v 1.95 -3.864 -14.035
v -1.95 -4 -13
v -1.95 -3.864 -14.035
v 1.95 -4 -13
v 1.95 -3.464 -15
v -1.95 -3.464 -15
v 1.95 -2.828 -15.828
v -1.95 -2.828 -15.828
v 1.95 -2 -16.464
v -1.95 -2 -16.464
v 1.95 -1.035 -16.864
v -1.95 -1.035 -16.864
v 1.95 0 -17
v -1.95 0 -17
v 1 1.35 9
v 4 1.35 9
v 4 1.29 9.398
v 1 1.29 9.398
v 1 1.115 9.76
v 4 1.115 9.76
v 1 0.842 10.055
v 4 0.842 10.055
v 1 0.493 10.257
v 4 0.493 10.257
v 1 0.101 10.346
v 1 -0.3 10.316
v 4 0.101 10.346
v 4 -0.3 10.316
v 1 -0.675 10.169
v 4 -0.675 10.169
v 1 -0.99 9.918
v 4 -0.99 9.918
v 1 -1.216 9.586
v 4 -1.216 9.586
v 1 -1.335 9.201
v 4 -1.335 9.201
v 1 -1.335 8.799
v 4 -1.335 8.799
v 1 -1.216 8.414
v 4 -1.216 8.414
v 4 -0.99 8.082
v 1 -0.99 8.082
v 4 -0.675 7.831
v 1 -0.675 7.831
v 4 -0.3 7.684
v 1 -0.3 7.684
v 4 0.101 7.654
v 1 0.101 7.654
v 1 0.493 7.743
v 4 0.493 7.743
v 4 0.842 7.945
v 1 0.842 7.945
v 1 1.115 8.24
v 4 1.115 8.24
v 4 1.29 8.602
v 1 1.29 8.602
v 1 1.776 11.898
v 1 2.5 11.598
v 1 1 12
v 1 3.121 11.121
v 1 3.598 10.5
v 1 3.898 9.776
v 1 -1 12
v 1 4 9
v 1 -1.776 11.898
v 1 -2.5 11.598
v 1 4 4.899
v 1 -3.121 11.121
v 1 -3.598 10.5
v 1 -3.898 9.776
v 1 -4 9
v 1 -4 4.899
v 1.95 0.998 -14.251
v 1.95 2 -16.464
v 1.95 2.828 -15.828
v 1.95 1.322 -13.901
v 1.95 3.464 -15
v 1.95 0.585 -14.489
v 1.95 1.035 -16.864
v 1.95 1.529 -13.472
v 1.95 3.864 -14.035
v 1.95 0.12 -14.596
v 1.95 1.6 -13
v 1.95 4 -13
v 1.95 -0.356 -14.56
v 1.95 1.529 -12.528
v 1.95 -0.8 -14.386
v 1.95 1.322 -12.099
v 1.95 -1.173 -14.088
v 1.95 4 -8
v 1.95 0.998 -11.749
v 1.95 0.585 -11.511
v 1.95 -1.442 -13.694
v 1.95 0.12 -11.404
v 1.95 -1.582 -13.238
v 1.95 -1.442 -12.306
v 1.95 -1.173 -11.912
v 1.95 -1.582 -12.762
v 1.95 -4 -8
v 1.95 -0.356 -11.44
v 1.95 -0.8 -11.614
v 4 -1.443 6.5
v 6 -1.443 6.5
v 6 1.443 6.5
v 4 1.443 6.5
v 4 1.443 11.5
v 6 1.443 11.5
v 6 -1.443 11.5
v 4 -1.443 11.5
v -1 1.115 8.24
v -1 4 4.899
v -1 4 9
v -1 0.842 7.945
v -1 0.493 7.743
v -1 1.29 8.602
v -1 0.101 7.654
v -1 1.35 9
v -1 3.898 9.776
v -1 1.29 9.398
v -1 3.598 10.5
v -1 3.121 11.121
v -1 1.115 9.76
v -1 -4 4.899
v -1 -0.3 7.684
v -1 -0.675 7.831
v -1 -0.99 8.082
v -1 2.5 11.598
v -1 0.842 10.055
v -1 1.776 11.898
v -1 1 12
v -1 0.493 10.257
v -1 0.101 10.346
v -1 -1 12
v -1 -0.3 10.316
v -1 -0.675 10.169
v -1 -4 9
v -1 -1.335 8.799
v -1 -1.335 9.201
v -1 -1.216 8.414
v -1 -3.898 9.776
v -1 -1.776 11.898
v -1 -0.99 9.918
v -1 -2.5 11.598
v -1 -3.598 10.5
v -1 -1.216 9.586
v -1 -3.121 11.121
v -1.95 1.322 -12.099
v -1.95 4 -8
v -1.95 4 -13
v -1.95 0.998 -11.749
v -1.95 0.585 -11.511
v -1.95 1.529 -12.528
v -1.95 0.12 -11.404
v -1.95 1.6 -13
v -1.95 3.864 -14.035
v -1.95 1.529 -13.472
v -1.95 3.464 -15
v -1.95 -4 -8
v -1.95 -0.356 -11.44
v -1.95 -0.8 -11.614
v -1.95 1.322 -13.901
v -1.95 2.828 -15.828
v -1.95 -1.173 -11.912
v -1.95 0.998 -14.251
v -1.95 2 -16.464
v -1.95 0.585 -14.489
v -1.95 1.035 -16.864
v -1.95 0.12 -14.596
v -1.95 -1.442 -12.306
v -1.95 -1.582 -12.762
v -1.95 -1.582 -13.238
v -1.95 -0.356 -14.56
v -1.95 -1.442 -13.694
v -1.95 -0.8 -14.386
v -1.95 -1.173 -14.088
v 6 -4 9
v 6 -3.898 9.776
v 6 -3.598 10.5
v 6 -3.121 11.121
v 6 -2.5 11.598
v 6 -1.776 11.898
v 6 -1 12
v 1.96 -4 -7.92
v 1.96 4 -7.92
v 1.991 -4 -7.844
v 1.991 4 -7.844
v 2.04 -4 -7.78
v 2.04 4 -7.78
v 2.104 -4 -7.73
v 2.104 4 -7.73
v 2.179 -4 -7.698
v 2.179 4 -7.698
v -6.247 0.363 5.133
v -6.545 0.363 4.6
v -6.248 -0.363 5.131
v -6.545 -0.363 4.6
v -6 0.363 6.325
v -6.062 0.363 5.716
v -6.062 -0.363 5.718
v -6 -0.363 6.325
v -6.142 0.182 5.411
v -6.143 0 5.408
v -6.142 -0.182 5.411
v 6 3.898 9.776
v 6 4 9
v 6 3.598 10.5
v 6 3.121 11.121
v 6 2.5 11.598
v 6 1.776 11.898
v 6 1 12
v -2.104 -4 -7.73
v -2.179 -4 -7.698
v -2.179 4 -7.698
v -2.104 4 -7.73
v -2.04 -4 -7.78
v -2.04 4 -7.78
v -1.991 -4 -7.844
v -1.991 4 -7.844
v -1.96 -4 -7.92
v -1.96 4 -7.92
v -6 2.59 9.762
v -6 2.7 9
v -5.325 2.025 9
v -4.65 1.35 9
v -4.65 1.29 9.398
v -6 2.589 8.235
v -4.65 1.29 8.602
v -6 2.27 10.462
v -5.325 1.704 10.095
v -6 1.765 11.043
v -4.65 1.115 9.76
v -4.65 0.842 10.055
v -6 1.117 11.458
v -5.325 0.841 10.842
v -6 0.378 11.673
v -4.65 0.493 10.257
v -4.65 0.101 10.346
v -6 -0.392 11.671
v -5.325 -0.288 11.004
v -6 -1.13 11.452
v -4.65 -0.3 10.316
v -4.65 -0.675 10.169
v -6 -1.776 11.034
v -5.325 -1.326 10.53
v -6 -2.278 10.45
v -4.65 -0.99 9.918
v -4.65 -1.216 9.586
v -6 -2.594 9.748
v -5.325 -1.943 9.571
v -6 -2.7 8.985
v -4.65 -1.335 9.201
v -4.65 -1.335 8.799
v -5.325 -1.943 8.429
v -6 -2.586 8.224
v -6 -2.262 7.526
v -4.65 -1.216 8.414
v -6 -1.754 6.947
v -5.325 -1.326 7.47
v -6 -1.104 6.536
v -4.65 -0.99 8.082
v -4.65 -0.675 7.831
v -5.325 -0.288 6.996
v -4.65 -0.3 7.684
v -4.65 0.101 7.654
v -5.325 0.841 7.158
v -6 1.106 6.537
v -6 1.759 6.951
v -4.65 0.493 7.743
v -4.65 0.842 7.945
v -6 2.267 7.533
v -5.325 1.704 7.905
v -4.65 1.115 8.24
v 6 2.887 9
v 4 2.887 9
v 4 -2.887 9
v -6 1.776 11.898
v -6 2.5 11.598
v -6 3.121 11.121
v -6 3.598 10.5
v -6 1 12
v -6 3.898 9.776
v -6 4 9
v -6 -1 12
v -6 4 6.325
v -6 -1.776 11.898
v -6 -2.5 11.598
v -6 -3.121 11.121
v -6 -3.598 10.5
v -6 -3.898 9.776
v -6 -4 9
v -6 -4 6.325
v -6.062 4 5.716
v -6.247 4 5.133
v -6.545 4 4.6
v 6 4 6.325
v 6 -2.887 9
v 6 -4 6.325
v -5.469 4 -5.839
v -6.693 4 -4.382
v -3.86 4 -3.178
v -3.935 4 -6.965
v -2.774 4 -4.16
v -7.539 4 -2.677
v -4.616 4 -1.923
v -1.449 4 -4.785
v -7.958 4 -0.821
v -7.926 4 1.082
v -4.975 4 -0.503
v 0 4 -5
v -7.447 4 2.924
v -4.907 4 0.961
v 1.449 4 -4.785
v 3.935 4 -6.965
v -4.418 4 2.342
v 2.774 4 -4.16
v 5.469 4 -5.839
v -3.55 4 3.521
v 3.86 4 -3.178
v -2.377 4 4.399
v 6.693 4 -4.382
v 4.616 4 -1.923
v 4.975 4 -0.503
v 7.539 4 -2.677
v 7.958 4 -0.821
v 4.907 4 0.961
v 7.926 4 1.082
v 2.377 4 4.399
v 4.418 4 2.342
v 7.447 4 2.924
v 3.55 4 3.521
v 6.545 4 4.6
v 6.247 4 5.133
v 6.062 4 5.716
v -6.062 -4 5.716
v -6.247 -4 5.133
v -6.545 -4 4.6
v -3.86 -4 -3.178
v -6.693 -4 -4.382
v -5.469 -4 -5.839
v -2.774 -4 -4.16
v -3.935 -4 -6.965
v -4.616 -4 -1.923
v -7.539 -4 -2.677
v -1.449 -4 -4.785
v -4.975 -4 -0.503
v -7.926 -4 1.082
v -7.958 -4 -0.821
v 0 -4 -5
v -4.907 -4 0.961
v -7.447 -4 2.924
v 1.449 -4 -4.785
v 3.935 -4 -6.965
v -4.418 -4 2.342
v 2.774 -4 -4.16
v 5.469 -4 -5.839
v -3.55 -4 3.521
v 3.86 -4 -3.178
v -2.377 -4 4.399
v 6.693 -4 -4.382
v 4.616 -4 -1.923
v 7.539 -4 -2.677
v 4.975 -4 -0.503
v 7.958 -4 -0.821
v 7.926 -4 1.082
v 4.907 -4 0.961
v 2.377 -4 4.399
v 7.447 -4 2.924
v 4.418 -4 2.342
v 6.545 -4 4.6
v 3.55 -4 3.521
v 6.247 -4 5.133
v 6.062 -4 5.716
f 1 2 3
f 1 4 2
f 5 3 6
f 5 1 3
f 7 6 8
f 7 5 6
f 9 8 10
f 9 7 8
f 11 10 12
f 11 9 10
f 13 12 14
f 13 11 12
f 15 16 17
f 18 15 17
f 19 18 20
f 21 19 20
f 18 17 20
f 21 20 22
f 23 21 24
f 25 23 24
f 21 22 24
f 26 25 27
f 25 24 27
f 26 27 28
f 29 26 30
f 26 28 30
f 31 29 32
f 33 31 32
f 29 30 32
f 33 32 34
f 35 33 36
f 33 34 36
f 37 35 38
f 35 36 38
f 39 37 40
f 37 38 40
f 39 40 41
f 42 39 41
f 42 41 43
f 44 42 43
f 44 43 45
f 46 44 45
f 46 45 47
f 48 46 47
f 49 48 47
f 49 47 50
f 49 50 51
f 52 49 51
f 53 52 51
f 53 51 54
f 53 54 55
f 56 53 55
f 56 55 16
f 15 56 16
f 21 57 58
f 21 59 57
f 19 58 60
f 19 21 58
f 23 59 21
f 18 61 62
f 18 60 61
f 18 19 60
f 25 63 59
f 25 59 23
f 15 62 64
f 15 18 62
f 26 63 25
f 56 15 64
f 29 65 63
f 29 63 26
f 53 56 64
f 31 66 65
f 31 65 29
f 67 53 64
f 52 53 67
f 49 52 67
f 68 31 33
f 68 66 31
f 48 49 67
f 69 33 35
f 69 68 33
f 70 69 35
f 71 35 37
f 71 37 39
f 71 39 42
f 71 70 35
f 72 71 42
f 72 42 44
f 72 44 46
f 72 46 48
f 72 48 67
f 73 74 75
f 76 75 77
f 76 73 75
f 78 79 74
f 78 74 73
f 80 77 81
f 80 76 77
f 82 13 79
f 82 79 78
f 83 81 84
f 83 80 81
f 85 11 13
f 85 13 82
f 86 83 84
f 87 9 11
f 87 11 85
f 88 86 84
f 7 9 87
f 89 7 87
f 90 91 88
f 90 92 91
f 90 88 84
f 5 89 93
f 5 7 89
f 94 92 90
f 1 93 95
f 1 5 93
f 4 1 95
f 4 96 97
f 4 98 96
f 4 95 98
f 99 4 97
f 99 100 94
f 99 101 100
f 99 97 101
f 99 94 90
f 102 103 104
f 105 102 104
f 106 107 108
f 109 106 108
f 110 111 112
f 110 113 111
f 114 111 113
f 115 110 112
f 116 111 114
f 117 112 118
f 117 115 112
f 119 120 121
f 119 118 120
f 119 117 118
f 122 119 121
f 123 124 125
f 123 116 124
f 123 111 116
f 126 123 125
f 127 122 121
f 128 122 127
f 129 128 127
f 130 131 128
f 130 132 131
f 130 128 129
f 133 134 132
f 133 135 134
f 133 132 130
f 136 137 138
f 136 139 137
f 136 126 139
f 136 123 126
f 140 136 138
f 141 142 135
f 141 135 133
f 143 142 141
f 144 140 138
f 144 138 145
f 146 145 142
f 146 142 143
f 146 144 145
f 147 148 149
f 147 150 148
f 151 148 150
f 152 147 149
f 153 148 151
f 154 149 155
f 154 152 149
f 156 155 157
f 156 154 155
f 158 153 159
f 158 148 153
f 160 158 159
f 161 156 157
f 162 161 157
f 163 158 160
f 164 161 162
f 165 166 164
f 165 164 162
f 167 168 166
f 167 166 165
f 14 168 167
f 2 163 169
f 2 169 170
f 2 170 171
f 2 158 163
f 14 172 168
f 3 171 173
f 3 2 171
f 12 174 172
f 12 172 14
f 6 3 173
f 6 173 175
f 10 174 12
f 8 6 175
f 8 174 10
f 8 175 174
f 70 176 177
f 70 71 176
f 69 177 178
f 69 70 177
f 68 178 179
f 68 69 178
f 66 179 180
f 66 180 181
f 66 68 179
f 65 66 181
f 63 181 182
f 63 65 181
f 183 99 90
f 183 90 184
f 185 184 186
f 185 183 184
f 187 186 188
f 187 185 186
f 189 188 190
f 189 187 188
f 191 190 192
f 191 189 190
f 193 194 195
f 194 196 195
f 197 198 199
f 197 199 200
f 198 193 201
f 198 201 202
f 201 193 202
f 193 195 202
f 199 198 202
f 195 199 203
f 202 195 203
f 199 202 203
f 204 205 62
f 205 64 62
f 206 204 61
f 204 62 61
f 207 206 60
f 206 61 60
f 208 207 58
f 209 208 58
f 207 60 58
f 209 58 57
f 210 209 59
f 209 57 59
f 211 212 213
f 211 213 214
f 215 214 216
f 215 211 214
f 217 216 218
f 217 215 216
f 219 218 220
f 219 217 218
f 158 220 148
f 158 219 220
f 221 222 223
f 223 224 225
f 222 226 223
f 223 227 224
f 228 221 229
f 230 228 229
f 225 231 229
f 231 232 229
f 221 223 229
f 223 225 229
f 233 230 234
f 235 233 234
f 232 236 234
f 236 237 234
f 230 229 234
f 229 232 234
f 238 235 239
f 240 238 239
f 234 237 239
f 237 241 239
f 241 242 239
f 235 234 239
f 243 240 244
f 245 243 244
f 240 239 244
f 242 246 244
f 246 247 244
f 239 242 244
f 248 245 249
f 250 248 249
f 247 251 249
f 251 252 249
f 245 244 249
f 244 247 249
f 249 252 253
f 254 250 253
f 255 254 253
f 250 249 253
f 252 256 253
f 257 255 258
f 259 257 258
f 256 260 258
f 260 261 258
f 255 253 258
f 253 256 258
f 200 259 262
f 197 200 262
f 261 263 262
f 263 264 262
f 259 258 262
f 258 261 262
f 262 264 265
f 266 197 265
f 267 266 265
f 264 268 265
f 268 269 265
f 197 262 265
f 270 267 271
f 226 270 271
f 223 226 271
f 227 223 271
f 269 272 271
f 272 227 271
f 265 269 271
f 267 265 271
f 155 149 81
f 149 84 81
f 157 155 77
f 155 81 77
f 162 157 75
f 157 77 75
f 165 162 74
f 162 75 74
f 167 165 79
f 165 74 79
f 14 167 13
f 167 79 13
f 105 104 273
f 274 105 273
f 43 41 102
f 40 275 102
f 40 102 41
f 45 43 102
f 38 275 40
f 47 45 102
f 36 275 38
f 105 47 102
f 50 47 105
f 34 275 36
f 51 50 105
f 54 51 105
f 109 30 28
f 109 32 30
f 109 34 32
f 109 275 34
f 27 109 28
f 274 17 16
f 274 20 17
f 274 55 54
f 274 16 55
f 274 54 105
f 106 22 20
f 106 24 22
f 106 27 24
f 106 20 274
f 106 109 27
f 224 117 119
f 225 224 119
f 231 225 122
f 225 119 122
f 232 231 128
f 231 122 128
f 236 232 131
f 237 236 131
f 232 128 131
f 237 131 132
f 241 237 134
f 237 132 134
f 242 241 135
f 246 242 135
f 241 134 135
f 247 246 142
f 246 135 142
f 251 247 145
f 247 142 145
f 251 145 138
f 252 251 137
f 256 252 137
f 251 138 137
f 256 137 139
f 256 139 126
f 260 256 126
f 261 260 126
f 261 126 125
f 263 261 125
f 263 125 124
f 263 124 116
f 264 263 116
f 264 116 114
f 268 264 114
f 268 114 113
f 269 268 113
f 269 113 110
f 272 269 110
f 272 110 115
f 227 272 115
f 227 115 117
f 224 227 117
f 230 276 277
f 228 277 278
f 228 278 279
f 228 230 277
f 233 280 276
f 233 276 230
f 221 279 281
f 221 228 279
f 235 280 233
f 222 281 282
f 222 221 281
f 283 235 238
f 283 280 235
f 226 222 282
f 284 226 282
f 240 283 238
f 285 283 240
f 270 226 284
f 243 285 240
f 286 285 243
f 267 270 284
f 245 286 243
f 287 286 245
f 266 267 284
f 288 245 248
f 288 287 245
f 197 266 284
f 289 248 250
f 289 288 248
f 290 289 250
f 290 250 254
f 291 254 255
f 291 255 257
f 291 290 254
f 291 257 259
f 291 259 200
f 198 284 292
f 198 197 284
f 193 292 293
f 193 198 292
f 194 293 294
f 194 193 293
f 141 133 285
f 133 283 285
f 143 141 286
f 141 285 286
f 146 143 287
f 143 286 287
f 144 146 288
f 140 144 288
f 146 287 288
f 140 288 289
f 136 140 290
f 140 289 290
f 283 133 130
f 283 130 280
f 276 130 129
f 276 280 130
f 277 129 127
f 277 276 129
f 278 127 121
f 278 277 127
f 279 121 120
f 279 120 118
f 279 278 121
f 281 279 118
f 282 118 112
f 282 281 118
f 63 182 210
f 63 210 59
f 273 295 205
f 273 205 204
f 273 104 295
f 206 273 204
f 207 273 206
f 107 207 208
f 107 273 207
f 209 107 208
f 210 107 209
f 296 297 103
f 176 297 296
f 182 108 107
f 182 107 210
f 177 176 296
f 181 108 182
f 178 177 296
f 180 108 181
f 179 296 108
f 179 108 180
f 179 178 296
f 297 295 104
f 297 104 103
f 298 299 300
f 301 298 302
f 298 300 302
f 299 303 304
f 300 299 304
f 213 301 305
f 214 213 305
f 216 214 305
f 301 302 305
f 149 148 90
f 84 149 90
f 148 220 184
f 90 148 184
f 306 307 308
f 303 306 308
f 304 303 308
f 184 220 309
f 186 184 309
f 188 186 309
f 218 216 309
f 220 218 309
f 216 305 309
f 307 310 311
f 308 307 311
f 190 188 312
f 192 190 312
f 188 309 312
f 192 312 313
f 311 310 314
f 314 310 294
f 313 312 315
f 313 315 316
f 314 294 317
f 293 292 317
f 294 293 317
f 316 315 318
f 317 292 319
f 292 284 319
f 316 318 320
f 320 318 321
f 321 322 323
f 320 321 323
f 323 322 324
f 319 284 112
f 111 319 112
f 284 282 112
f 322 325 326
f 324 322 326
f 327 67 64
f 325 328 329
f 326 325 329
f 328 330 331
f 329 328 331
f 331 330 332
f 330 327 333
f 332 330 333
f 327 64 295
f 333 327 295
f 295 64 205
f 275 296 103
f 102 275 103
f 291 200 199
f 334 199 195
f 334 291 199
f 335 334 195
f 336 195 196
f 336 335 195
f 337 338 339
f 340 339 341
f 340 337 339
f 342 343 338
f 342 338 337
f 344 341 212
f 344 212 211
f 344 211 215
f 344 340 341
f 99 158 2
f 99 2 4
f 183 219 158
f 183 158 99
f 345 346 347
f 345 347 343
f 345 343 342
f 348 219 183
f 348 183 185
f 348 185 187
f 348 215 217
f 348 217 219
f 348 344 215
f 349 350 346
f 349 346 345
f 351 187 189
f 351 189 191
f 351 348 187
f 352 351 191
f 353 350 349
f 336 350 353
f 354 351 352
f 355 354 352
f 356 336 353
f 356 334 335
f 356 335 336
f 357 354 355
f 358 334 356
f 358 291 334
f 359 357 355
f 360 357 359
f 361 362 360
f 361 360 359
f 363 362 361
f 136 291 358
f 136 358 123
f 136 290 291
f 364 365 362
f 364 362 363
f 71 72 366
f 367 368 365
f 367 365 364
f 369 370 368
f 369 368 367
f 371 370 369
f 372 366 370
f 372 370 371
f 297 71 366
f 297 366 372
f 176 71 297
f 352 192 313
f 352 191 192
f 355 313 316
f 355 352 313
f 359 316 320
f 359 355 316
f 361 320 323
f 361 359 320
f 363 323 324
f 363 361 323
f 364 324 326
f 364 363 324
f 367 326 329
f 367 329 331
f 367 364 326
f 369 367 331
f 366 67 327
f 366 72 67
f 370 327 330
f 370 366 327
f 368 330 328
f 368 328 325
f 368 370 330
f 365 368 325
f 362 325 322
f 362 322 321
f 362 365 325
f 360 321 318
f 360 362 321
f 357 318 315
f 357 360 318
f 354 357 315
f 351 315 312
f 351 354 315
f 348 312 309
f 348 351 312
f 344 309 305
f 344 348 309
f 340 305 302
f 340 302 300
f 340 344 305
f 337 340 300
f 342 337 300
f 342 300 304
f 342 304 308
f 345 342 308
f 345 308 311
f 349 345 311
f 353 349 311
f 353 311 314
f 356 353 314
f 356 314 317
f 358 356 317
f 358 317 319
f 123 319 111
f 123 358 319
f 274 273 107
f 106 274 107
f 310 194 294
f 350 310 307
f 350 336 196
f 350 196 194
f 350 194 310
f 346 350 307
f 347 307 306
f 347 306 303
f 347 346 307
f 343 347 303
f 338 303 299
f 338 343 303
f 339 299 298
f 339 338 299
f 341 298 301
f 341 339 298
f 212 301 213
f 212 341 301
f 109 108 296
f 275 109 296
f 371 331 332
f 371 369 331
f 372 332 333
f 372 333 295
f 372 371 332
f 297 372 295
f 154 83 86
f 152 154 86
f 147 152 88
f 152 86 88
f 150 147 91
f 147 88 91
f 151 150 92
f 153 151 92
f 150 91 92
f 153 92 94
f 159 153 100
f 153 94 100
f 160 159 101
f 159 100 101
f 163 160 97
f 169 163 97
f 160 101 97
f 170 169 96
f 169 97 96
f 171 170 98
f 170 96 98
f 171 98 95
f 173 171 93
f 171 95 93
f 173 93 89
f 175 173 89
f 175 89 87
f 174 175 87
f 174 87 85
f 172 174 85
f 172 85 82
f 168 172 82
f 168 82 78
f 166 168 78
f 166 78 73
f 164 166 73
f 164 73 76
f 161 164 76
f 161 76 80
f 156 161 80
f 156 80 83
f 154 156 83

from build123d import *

# Parameters (mm, degrees)
F1_DEPTH = 4
F2_R     = 1.35
F3_DEPTH = 25
F4_DEPTH = 2
F5_R     = 1.6
F6_DEPTH = 25
F7_SIZE  = 1.35
F8_R     = 3
F9_R     = 3.99999


# Not quite as in the source:
# - a fillet or chamfer is up to 0.001 mm smaller than in the source, because OpenCascade refuses the exact size
# - a feature names something its author has since deleted; it is built from what else it names


with BuildPart() as f1:
    # F0 (on Front) → F1 (new body, symmetric)
    with BuildSketch(Plane.XZ):
        with BuildLine():
            ThreePointArc((1, 4.8989794856), (0, -5), (-1, 4.8989794856))
            Line((-1, 4.8989794856), (-1, 12))
            Line((-1, 12), (-6, 12))
            Line((-6, 12), (-6, 5.2915026221))
            ThreePointArc((-6, 5.2915026221), (-7.6747647209, -2.257872113), (-2.1786734922, -7.6976218285))
            ThreePointArc((-2.1786734922, -7.6976218285), (-2.0136051919, -7.8104451764), (-1.95, -8))
            Line((-1.95, -8), (-1.95, -17))
            Line((-1.95, -17), (1.95, -17))
            Line((1.95, -17), (1.95, -8))
            ThreePointArc((1.95, -8), (2.0136051919, -7.8104451764), (2.1786734922, -7.6976218285))
            ThreePointArc((2.1786734922, -7.6976218285), (7.6747647209, -2.257872113), (6, 5.2915026221))
            Line((6, 5.2915026221), (6, 12))
            Line((6, 12), (1, 12))
            Line((1, 12), (1, 4.8989794856))
        make_face()
    extrude(amount=F1_DEPTH, both=True)

    # F2 (on face) → F3 (cut)
    with BuildSketch(Plane.YZ.offset(6)):
        with Locations((0, 9)):
            Circle(F2_R)
    extrude(amount=-F3_DEPTH, mode=Mode.SUBTRACT)

    # F2 (on face) → F4 (cut)
    with BuildSketch(Plane.YZ.offset(6)):
        Polygon((2.8867513459, 9), (1.443375673, 11.5), (-1.443375673, 11.5), (-2.8867513459, 9), (-1.443375673, 6.5), (1.443375673, 6.5), align=None)
        with Locations((0, 9)):
            Circle(F2_R, mode=Mode.SUBTRACT)
    extrude(amount=-F4_DEPTH, mode=Mode.SUBTRACT)

    # F5 (on face) → F6 (cut)
    with BuildSketch(Plane.YZ.offset(1.95)):
        with Locations((0, -13)):
            Circle(F5_R)
    extrude(amount=-F6_DEPTH, mode=Mode.SUBTRACT)

    # F7
    f7_edges = [f1.edges().sort_by_distance(p)[0] for p in [
        (-6, -1.35, 9),
    ]]
    chamfer(f7_edges, length=F7_SIZE)

    # F8
    f8_edges = [f1.edges().sort_by_distance(p)[0] for p in [
        (-3.5, -4, 12),
        (-3.5, 4, 12),
        (3.5, 4, 12),
        (3.5, -4, 12),
        (6, 0, 5.291503),
        (-6, 0, 5.291503),
    ]]
    fillet(f8_edges, radius=F8_R)

    # F9 (radius 4 in the source; OpenCascade refuses exactly that, so slightly less here)
    f9_edges = [f1.edges().sort_by_distance(p)[0] for p in [
        (0, -4, -17),
        (0, 4, -17),
    ]]
    fillet(f9_edges, radius=F9_R)


solid = f1.part
